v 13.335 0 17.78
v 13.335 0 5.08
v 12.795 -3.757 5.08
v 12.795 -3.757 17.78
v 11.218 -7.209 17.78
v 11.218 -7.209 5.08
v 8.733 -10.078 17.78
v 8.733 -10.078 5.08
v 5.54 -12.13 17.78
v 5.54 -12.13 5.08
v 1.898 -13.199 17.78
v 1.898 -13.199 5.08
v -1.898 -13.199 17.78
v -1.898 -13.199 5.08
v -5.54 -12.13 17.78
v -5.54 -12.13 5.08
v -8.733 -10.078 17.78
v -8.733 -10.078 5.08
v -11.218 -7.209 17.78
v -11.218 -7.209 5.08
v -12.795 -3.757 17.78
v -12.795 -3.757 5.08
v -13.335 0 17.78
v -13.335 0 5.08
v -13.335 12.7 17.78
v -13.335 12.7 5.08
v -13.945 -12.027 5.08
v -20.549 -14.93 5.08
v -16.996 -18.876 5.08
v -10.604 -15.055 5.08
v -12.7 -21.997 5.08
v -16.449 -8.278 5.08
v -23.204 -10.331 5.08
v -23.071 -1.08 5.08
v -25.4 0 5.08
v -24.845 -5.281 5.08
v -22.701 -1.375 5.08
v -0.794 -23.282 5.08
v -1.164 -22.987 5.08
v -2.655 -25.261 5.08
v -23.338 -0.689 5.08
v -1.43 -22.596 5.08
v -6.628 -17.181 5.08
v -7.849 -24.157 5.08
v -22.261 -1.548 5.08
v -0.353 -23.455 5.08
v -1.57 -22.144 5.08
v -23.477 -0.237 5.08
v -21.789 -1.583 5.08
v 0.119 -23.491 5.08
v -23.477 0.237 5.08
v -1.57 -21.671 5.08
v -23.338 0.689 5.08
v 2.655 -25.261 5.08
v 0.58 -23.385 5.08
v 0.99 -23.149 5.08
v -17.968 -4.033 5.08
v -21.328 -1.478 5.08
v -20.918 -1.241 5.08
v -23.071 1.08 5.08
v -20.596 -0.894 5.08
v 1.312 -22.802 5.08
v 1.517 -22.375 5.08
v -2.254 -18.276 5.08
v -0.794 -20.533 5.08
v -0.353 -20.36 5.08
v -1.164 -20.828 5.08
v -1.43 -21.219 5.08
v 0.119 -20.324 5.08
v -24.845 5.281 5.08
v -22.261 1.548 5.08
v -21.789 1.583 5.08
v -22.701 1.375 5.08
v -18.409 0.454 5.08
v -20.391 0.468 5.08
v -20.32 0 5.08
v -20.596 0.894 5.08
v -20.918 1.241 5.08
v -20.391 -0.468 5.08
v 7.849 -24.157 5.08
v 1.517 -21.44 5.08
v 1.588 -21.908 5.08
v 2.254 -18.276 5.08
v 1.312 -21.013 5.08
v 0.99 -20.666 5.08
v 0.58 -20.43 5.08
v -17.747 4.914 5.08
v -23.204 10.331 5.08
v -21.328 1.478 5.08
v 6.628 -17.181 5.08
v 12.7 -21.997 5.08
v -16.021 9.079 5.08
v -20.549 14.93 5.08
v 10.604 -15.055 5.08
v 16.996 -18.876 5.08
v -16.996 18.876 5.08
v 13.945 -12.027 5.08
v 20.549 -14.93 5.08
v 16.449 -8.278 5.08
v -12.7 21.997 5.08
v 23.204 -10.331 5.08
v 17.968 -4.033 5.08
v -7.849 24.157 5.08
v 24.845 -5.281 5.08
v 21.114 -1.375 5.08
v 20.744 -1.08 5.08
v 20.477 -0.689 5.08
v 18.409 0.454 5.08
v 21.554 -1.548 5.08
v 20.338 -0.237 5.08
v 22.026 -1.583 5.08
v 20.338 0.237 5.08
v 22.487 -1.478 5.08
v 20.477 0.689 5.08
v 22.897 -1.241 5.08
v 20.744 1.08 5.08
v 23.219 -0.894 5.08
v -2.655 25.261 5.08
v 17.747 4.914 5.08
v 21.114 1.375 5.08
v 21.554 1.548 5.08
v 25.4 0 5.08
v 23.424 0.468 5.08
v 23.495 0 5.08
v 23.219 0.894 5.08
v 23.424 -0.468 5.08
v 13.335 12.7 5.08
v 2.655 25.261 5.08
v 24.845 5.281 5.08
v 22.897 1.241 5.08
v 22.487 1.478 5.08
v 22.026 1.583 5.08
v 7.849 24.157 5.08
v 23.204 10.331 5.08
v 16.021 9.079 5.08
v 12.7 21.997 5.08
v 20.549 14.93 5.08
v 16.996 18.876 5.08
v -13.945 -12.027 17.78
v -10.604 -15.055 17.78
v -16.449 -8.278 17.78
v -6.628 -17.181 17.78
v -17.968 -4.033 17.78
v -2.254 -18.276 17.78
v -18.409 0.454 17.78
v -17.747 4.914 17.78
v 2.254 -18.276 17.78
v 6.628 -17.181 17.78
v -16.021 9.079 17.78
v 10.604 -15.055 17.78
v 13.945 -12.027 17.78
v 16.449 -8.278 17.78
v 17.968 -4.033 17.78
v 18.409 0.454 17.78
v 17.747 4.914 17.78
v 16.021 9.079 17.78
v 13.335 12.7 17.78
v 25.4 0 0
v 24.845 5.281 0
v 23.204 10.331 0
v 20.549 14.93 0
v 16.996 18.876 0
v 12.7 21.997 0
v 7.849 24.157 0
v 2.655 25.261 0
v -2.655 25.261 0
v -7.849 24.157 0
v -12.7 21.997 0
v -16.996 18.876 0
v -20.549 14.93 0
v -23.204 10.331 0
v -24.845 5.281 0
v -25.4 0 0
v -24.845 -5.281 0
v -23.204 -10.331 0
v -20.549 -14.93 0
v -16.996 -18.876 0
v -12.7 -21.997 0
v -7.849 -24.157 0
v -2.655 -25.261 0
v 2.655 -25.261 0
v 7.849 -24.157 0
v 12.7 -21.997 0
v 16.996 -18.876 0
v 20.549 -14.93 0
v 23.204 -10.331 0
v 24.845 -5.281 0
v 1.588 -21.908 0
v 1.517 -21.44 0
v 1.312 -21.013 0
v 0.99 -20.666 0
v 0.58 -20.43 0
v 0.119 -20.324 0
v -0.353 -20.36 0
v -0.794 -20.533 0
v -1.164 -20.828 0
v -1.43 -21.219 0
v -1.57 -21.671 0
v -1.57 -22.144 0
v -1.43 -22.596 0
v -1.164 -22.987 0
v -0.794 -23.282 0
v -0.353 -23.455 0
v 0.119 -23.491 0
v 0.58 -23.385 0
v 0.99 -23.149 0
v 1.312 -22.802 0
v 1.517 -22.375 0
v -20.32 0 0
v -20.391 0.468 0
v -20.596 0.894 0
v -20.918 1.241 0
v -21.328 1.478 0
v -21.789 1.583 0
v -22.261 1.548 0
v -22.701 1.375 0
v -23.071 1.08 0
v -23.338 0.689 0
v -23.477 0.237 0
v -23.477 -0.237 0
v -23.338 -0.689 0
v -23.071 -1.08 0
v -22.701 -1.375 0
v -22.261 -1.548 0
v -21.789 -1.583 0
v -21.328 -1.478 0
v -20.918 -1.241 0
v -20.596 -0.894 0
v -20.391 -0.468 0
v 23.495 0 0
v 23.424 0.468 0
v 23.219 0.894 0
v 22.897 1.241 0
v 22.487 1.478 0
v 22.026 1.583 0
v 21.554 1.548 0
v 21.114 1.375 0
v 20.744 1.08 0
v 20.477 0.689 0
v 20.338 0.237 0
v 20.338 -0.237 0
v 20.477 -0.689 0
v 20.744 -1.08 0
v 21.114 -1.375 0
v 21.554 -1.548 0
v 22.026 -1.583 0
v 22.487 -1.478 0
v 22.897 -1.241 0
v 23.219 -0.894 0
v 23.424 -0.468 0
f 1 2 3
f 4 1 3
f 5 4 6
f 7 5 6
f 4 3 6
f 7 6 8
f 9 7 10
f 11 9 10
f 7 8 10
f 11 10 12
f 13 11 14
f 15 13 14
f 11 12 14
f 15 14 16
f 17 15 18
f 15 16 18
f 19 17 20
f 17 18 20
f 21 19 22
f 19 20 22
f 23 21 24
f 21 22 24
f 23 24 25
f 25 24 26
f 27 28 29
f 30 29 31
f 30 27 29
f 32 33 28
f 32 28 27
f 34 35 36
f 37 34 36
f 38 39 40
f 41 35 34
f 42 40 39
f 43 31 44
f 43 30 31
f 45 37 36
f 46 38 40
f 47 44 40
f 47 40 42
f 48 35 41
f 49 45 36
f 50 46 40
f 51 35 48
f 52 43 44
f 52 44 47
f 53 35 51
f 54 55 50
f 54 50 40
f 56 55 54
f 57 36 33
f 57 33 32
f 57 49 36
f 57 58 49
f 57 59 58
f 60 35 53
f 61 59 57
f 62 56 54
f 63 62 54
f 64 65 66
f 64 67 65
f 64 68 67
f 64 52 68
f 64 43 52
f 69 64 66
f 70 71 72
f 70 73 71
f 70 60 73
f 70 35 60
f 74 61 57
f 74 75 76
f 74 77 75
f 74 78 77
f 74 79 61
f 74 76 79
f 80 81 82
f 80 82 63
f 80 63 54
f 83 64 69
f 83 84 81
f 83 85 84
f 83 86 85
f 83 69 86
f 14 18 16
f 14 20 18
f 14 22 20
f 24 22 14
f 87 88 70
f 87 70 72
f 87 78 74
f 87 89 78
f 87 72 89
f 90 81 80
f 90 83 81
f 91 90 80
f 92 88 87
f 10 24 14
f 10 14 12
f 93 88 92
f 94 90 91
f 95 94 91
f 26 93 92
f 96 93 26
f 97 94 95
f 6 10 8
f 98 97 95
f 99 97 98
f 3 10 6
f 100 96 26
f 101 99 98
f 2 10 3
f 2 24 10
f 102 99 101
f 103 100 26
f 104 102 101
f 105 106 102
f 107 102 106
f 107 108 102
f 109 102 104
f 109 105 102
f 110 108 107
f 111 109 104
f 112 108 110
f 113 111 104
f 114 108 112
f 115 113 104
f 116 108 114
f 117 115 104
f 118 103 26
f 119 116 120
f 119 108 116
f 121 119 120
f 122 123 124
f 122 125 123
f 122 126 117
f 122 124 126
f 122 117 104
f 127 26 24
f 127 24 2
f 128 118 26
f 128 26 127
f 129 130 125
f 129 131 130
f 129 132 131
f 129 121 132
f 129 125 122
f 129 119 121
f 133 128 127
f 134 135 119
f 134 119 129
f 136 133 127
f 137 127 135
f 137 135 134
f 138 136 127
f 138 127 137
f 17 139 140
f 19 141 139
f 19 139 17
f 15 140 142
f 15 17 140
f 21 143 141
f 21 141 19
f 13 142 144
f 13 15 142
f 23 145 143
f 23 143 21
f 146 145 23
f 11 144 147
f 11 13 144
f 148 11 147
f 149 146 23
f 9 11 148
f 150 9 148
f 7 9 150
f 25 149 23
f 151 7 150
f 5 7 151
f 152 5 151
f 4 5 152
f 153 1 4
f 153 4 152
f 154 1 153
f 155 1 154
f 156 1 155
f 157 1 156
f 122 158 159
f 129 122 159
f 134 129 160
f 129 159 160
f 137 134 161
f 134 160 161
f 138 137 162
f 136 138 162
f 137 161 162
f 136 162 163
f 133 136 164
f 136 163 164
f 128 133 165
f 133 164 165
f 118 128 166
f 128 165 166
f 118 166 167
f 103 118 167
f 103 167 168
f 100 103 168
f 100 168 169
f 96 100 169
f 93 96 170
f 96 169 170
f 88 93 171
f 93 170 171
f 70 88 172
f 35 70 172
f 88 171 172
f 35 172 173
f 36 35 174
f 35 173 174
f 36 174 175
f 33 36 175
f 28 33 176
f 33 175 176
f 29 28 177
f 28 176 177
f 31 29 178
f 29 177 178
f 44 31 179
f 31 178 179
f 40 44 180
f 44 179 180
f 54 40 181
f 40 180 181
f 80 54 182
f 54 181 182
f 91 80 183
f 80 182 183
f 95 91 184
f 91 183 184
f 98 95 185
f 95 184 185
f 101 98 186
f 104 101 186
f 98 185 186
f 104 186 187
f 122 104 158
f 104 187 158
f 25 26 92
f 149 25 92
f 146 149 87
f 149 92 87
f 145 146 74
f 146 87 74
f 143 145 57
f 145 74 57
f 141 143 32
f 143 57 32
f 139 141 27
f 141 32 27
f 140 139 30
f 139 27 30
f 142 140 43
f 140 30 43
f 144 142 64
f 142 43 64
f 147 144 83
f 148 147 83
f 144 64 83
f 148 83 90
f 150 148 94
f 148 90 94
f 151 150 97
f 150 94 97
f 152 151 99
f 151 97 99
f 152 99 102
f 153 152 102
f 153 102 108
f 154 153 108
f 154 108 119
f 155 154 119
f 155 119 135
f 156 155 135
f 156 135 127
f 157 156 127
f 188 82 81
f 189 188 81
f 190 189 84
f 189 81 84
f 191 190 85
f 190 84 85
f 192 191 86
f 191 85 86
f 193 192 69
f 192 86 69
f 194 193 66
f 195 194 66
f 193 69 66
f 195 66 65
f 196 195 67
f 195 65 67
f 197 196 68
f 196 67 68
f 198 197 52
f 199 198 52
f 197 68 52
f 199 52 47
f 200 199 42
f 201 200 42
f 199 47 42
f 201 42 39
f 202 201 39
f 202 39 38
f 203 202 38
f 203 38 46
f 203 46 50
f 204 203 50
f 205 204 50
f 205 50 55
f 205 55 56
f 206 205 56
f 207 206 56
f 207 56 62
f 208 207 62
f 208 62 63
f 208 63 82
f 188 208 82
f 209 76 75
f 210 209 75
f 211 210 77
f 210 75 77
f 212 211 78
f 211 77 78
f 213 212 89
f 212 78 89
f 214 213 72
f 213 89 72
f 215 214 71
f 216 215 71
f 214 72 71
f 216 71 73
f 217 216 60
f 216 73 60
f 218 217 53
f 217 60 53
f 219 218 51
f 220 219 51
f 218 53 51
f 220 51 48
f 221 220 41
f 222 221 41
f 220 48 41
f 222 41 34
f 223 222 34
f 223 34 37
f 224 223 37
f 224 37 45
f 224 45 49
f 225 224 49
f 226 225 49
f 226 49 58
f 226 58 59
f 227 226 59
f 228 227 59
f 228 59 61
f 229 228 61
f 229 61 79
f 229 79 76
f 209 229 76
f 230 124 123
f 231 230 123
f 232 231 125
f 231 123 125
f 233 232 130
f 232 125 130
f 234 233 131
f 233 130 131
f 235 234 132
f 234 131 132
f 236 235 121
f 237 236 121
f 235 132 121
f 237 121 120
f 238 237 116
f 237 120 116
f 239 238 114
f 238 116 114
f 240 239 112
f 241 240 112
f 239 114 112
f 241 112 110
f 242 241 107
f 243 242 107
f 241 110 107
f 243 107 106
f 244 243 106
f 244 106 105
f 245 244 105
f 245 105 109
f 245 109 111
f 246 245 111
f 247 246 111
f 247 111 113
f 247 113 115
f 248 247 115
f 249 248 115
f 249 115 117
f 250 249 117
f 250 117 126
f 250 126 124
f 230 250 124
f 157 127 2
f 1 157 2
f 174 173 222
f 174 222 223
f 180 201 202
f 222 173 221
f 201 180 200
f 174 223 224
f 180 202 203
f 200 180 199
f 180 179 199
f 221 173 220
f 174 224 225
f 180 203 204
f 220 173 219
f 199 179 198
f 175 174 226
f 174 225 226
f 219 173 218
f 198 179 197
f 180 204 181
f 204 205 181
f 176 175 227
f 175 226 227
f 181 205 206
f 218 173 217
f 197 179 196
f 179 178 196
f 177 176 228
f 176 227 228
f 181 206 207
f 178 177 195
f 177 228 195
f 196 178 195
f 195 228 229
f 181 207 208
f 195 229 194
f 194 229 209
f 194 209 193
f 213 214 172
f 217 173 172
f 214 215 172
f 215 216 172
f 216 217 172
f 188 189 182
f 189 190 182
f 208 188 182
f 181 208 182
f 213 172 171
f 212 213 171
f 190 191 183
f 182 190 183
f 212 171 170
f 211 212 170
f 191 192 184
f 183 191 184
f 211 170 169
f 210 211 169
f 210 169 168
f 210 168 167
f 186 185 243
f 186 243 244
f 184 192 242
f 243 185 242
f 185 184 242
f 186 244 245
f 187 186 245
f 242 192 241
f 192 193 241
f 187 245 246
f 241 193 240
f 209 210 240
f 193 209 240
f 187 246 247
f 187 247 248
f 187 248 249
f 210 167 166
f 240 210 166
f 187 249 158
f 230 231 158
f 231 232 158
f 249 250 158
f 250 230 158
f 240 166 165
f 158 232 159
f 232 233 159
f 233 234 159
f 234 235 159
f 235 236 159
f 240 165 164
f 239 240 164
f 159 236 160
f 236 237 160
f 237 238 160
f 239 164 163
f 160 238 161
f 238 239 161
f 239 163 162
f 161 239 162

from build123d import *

# Parameters (mm, degrees)
F0_R     = 25.4
F1_DEPTH = 5.08
F3_DEPTH = 12.7
F4_R     = 1.5875
F5_DEPTH = 25.4


with BuildPart() as f1:
    # F0 (on Top) → F1 (new body)
    with BuildSketch(Plane.XY):
        Circle(F0_R)
    extrude(amount=F1_DEPTH)

    # F2 (on face) → F3 (join)
    with BuildSketch(Plane.XY.offset(5.08)):
        with BuildLine():
            ThreePointArc((13.335, 0), (0, -13.335), (-13.335, 0))
            Line((-13.335, 0), (-13.335, 12.7))
            ThreePointArc((-13.335, 12.7), (0, -18.415), (13.335, 12.7))
            Line((13.335, 12.7), (13.335, 0))
        make_face()
    extrude(amount=F3_DEPTH)

    # F4 (on face) → F5 (cut)
    with BuildSketch(Plane.XY.offset(5.08)):
        with Locations((-21.9075, 0)):
            Circle(F4_R)
        with Locations((21.9075, 0)):
            Circle(F4_R)
        with Locations((0, -21.9075)):
            Circle(F4_R)
    extrude(amount=-F5_DEPTH, mode=Mode.SUBTRACT)


solid = f1.part
